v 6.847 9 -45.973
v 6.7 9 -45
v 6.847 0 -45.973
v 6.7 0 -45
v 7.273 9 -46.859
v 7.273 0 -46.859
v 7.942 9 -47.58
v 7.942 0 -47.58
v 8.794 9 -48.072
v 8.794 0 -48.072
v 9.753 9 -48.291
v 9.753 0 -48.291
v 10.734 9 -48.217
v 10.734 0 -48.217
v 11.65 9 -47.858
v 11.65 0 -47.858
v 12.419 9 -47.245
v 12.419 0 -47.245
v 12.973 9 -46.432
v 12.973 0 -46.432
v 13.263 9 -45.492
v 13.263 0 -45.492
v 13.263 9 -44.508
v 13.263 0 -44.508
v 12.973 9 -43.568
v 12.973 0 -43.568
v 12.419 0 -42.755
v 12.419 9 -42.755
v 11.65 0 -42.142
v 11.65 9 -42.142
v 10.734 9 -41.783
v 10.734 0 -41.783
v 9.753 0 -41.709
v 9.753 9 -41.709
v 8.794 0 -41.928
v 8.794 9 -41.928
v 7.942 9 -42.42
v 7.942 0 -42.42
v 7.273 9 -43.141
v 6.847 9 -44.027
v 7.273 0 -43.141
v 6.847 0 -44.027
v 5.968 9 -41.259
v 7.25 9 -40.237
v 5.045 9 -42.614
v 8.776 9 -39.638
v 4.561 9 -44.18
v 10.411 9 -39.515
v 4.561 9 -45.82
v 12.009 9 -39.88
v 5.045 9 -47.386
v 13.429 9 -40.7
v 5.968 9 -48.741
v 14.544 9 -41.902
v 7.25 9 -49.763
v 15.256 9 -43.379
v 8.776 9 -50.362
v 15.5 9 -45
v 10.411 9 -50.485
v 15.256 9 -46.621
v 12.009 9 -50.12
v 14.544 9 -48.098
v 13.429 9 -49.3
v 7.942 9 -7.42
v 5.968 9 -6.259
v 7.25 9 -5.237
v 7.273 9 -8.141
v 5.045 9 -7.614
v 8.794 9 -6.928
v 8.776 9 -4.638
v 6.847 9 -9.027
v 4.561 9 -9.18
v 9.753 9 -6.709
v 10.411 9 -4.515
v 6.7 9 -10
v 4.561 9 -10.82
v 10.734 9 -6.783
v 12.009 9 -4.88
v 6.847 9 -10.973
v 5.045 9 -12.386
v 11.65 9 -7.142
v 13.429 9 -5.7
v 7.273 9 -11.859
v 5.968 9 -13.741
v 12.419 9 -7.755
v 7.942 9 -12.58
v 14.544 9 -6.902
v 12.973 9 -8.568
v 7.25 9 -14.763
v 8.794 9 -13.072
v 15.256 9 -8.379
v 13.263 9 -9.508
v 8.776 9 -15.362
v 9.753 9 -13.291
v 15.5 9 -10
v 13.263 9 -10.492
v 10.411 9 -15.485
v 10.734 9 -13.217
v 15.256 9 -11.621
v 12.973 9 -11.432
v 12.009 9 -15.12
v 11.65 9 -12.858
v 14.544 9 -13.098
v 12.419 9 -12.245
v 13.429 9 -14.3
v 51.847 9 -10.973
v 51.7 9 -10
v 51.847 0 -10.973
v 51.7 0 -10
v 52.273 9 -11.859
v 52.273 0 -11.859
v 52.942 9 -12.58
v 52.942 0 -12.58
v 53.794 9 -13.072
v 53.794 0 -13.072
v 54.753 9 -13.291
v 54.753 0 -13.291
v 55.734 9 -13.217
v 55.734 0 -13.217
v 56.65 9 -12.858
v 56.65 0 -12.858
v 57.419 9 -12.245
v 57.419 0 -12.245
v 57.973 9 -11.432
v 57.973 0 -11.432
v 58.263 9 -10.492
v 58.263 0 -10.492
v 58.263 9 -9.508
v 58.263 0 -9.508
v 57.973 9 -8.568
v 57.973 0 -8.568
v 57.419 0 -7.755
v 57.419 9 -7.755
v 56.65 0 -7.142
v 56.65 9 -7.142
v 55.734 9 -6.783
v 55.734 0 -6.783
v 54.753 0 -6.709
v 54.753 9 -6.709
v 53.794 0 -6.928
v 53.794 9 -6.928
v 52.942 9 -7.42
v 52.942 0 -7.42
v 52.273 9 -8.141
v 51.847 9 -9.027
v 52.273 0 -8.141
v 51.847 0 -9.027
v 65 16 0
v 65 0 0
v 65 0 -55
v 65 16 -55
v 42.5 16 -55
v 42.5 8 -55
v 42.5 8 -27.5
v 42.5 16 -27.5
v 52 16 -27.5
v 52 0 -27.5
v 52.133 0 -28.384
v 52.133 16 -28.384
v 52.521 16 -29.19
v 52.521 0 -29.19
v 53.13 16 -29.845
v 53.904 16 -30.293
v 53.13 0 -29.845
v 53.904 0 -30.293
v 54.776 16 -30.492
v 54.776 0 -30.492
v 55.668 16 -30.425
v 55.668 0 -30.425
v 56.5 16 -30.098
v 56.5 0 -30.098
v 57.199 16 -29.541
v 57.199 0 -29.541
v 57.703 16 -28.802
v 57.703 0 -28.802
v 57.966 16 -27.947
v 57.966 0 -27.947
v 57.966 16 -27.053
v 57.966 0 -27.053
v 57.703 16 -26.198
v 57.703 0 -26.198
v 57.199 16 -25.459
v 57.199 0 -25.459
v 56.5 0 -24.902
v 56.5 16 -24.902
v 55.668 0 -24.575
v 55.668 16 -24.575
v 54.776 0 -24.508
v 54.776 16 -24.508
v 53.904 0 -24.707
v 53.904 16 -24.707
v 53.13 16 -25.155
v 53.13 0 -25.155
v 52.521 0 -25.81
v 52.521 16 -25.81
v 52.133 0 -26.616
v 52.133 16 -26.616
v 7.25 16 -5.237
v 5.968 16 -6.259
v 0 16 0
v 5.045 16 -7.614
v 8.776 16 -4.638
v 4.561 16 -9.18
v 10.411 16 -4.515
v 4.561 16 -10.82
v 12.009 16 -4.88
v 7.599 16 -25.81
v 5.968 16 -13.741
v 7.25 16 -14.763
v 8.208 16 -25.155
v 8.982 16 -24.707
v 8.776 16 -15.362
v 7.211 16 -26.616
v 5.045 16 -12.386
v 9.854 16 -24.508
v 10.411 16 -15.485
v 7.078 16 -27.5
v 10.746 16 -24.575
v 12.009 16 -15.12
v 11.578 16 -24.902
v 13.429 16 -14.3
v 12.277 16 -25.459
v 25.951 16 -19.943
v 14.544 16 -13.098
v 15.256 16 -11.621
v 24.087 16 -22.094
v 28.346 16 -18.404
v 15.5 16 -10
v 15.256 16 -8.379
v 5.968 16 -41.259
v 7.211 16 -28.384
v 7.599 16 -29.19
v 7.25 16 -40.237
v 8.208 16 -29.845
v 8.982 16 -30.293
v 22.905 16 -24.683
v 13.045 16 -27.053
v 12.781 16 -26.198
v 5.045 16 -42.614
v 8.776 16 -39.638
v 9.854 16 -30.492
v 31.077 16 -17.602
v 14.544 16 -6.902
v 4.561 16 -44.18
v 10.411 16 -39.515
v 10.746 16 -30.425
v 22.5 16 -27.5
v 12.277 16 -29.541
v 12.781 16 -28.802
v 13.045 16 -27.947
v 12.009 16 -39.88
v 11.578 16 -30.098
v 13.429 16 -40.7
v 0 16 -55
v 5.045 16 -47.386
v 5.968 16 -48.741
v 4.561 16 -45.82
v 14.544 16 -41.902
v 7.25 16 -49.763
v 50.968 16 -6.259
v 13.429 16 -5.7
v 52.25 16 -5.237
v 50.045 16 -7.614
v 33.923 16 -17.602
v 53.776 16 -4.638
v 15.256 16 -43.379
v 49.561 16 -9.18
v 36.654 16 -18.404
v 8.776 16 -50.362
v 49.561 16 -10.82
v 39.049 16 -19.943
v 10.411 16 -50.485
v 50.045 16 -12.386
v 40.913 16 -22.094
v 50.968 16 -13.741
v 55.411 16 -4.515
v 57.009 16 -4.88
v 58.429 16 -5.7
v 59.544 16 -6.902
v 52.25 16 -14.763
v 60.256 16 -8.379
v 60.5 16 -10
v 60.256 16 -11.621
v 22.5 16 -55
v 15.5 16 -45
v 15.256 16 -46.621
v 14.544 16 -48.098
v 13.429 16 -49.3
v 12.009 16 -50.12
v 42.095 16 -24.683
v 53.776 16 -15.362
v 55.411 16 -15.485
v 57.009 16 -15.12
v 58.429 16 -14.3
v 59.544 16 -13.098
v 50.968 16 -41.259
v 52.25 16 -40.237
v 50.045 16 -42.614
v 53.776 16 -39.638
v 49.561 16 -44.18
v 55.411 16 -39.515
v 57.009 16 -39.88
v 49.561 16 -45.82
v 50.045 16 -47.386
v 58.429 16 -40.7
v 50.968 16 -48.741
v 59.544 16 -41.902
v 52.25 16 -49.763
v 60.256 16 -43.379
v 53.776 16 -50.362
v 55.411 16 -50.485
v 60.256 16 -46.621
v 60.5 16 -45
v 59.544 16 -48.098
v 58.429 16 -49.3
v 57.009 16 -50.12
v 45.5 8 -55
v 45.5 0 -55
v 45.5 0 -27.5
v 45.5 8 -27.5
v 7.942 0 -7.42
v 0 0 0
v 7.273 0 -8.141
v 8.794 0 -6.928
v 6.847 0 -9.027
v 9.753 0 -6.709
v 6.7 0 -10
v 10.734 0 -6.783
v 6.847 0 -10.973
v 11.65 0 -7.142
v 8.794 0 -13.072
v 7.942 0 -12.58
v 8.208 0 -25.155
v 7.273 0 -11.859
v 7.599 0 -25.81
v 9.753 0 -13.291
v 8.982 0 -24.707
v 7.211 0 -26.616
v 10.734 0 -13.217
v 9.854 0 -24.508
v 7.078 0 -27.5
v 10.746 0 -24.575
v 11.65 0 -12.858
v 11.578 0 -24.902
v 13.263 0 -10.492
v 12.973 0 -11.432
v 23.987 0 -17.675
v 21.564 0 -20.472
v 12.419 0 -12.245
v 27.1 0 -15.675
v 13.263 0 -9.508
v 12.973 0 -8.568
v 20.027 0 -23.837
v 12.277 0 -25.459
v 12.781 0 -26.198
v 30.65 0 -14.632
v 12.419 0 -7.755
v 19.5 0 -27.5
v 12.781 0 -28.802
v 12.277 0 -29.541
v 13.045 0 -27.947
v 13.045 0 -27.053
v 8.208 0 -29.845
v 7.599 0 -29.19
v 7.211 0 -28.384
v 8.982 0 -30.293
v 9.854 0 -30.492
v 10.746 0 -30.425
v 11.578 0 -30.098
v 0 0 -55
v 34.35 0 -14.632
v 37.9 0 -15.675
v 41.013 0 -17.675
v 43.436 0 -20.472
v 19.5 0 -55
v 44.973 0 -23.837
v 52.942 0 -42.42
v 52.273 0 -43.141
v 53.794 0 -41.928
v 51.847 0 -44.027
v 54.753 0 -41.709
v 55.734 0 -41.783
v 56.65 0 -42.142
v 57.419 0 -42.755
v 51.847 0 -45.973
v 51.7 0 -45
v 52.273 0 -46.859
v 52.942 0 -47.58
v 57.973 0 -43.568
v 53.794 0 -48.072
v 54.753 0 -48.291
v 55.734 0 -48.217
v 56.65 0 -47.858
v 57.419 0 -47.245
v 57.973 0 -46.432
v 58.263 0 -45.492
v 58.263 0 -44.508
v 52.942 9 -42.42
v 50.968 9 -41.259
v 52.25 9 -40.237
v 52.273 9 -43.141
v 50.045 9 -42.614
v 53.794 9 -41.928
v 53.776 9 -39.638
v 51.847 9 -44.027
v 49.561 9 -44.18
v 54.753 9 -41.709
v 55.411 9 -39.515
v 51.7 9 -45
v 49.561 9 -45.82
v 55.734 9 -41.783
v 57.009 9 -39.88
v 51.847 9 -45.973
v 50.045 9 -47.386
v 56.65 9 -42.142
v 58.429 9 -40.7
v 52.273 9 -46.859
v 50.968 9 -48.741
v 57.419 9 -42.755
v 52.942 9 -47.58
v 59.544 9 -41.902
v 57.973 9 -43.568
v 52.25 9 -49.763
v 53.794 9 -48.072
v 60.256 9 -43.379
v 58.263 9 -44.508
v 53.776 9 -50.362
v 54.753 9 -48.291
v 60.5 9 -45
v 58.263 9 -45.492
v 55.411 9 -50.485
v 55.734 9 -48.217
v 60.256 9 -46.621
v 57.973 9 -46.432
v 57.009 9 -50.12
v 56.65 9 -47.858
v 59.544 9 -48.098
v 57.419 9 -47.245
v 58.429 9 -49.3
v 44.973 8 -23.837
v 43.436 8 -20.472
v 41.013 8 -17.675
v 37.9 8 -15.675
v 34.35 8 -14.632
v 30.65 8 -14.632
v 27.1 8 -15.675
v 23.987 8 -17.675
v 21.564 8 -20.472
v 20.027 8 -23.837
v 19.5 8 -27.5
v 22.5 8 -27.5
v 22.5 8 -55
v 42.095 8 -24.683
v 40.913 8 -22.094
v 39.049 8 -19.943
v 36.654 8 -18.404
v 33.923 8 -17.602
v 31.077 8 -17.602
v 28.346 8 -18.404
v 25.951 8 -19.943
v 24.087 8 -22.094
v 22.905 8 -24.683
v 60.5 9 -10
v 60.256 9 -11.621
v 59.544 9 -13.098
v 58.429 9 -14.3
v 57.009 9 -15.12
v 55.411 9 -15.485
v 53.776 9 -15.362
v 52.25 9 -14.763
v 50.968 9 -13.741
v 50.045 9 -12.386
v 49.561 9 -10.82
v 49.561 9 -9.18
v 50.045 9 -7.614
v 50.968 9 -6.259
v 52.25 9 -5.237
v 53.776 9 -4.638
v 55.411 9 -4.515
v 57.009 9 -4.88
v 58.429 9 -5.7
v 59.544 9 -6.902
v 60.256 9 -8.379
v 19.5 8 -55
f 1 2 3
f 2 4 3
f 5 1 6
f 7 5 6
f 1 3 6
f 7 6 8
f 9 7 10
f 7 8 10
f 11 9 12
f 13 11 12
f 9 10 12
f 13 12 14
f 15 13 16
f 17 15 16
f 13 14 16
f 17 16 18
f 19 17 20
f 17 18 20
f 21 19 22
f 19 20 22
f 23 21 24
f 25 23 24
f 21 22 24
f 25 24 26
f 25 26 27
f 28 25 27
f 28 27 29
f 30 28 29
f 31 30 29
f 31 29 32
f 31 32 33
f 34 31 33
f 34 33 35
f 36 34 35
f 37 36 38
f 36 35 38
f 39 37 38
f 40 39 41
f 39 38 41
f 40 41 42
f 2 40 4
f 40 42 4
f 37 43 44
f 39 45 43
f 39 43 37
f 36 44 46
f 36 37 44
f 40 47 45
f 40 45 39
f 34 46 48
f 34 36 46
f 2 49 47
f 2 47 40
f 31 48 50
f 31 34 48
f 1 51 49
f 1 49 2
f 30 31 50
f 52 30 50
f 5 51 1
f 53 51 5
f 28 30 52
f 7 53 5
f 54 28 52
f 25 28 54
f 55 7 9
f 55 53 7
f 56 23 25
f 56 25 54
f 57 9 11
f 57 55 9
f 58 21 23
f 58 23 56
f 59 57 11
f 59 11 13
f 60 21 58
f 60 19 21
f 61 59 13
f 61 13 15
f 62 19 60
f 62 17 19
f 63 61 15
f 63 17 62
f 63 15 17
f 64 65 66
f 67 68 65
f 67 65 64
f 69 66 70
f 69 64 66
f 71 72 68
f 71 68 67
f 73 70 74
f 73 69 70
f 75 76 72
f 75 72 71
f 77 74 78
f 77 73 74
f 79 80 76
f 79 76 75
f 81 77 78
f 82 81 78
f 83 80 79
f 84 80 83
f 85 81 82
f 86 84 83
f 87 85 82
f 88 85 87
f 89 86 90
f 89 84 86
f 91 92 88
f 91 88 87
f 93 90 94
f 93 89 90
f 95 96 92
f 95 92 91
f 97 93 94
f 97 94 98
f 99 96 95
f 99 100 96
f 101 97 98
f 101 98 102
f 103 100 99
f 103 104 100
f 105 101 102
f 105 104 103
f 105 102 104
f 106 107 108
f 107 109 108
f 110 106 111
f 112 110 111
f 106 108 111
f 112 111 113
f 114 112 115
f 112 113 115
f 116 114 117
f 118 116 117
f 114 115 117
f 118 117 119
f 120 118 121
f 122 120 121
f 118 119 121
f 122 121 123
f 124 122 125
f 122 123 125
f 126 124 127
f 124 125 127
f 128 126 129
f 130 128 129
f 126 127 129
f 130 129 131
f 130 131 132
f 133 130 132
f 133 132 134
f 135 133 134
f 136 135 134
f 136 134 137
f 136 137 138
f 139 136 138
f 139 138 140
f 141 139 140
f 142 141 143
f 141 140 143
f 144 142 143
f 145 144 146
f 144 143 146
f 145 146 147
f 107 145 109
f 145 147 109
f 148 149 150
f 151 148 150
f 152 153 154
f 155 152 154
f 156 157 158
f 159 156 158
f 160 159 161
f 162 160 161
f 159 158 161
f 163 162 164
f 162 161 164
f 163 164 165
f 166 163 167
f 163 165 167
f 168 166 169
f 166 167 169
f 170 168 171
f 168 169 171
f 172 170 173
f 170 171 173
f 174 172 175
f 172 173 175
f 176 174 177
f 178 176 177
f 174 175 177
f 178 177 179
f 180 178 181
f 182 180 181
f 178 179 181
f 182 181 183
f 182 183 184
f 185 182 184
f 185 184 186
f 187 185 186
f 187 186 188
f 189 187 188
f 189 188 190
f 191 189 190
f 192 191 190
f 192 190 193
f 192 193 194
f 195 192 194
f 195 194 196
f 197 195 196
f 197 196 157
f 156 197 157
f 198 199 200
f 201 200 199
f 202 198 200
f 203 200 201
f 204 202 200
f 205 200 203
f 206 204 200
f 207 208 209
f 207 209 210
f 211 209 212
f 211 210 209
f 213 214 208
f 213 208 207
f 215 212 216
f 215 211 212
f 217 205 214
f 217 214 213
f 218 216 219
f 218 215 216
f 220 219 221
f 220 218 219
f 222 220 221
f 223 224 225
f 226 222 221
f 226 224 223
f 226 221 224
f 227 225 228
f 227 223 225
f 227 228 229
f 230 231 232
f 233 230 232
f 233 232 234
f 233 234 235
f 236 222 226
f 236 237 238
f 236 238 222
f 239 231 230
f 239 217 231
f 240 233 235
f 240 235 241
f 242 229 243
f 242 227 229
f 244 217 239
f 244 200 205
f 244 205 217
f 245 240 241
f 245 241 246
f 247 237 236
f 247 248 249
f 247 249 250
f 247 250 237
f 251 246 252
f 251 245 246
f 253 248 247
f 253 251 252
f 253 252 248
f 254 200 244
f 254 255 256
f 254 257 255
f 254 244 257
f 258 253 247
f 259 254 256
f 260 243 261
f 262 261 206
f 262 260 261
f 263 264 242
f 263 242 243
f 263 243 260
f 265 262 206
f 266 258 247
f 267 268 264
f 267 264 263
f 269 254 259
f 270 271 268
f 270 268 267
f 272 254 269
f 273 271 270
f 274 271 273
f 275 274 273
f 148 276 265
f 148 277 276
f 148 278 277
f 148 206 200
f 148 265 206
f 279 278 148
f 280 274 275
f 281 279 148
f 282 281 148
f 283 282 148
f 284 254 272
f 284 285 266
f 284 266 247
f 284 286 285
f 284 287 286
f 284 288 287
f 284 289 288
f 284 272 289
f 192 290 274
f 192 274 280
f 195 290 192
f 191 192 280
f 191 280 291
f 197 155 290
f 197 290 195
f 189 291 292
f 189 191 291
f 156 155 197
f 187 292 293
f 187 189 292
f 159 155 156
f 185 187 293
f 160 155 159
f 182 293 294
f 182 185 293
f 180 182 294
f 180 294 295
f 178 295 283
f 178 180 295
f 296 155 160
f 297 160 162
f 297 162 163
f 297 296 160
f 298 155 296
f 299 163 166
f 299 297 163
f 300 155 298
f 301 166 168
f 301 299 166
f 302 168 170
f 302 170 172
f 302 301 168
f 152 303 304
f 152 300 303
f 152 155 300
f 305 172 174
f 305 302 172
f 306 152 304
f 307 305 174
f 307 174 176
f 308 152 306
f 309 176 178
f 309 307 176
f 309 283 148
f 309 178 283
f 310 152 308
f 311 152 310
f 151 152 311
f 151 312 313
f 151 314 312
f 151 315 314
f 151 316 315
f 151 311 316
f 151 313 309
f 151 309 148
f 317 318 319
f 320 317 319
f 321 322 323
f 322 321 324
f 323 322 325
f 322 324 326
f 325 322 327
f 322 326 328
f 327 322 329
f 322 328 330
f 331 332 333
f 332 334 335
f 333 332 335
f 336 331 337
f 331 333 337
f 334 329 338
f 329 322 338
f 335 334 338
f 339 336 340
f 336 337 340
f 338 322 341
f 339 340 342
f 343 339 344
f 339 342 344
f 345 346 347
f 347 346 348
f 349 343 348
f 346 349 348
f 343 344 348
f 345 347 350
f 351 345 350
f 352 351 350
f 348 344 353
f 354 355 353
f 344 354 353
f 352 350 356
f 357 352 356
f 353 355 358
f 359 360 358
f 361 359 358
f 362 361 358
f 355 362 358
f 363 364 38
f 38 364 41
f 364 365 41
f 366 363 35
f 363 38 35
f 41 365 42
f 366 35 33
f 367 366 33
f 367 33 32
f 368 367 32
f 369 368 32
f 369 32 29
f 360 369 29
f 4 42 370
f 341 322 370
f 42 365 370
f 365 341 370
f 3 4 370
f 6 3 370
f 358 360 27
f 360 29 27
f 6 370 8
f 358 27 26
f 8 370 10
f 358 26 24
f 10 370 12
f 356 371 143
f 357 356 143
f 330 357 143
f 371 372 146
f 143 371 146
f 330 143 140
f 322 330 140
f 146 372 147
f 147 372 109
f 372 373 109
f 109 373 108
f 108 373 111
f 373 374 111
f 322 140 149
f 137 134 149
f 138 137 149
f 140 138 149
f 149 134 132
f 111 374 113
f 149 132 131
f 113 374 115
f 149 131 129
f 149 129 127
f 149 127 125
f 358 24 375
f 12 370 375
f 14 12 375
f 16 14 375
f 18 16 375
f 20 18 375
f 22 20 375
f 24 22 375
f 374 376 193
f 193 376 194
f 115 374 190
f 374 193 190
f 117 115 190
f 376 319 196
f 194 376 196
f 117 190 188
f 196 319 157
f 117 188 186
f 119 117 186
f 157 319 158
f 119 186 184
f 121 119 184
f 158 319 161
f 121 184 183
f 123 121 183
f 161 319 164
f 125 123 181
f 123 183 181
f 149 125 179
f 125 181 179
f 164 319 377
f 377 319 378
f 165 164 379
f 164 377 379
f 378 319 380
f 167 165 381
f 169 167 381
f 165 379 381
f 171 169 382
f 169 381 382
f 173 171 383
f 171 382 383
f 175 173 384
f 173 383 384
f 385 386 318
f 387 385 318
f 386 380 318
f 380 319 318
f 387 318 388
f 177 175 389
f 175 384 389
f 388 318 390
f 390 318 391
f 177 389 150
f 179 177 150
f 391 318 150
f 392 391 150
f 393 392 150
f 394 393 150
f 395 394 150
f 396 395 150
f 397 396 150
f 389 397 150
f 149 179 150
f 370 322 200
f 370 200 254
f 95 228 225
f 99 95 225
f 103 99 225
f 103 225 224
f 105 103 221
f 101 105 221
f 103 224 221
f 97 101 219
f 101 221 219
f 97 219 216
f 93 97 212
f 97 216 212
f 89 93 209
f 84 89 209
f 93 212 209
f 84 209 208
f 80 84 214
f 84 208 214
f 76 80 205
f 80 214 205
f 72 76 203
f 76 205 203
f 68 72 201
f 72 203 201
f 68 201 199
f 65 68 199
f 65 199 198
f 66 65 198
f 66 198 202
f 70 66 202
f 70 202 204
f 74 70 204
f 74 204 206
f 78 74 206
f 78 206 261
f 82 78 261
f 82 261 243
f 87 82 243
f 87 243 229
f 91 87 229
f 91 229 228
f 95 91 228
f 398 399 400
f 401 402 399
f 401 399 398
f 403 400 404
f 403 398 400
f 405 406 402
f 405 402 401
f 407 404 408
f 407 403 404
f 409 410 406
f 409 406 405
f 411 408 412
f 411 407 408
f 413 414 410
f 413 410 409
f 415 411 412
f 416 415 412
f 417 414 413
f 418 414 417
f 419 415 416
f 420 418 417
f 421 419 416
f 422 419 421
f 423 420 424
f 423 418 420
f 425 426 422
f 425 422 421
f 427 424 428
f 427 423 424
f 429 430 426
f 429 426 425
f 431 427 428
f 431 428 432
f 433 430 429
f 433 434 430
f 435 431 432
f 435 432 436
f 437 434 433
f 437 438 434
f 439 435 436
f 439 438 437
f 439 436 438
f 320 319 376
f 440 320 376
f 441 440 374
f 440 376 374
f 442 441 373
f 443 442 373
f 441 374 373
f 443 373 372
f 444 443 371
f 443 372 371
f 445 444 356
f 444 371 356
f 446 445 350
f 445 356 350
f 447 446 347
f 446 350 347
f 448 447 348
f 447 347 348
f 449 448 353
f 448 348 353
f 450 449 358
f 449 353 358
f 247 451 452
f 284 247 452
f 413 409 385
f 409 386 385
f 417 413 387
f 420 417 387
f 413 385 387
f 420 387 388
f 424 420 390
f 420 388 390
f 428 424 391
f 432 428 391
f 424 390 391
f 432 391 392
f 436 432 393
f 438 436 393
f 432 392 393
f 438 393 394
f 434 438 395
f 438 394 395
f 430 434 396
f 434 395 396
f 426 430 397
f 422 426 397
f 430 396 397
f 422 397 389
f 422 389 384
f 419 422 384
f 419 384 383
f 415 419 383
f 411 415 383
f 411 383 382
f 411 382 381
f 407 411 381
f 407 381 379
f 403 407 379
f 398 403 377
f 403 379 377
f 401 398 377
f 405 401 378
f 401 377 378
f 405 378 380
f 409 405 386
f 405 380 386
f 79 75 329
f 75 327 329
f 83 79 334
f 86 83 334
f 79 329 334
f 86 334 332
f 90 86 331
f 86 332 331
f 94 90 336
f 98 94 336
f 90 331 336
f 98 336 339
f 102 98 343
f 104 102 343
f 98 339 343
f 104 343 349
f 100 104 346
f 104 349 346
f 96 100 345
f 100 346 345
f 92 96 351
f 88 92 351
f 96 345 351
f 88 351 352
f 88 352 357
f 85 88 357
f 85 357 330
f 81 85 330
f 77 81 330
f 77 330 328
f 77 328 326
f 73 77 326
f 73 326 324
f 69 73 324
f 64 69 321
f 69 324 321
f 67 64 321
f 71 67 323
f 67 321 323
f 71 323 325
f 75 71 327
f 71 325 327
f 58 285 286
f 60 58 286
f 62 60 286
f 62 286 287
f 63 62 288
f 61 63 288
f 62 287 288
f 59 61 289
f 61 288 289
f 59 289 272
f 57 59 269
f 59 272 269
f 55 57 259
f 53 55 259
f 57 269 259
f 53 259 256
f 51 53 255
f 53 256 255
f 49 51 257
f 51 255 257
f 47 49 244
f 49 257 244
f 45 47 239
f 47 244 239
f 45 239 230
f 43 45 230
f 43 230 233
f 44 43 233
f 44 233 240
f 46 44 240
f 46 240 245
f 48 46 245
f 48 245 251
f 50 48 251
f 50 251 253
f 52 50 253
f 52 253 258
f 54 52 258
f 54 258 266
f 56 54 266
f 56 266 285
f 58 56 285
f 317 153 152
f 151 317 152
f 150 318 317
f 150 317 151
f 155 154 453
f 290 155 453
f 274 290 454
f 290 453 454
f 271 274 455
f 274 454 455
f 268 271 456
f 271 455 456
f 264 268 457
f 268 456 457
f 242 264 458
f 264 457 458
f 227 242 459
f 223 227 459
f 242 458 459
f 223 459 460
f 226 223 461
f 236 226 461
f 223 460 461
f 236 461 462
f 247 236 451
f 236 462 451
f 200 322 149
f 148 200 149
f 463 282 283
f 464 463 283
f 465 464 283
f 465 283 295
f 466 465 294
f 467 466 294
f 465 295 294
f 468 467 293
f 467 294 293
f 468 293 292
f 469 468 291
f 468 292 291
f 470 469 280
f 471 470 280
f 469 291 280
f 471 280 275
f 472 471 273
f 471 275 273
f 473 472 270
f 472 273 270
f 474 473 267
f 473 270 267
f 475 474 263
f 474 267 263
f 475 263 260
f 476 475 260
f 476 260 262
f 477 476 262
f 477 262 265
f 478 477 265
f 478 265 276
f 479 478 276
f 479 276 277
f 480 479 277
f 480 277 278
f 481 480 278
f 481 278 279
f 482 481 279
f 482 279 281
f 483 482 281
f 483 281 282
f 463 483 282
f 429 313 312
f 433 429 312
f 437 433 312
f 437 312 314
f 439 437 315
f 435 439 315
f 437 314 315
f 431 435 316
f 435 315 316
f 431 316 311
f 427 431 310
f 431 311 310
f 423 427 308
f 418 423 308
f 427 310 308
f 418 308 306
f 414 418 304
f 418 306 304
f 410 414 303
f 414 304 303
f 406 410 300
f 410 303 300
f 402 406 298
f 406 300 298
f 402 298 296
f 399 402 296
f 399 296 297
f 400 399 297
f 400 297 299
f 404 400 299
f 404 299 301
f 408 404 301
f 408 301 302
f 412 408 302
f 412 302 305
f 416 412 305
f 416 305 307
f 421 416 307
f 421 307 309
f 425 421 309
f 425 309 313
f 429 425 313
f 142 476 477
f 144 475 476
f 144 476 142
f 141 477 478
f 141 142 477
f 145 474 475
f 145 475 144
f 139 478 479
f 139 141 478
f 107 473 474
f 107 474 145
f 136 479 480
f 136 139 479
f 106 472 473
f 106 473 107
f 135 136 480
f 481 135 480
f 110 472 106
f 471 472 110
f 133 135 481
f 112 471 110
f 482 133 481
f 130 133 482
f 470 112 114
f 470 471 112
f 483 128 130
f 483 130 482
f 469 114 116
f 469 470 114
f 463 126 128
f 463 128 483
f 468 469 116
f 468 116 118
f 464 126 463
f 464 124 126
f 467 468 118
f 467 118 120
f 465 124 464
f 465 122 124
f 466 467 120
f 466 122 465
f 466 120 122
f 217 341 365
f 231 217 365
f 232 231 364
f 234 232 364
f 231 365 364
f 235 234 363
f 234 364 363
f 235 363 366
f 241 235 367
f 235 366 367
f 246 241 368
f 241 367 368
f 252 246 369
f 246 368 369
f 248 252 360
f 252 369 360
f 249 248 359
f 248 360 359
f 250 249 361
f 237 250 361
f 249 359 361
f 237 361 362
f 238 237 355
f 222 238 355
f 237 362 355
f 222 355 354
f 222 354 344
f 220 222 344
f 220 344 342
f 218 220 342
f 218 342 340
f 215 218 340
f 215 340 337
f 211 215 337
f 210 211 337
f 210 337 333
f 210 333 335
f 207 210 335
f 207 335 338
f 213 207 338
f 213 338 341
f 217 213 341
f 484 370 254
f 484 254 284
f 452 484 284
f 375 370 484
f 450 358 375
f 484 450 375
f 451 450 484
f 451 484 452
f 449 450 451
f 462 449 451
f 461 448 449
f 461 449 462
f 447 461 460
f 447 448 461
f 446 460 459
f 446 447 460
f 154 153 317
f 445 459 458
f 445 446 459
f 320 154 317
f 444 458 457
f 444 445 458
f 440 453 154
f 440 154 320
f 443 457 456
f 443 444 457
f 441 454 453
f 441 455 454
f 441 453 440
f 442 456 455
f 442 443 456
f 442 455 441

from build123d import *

# Parameters (mm, degrees)
SKETCH1_W                                            = 65
SKETCH1_H                                            = 55
BOSS_EXTRUDE1_DEPTH                                  = 16
CBORE_SLOT_FOR_M6_HEX_SOCKET_HEAD_CAP_SC_D           = 6.6
CBORE_SLOT_FOR_M6_HEX_SOCKET_HEAD_CAP_SC_CBORE_D     = 11
CBORE_SLOT_FOR_M6_HEX_SOCKET_HEAD_CAP_SC_CBORE_DEPTH = 7
F_6_0MM_DOWEL_HOLE1_D                                = 6
SKETCH23_R                                           = 13
CUT_EXTRUDE2_DEPTH                                   = 8
SKETCH24_R                                           = 10
CUT_EXTRUDE3_DEPTH                                   = 86.521927013


with BuildPart() as part:
    # Sketch1 → Boss-Extrude1 (new body)
    with BuildSketch(Plane(origin=(0, 0, 0), x_dir=(1, 0, 0), z_dir=(0, 1, 0))):
        with Locations((32.5, 27.5)):
            Rectangle(SKETCH1_W, SKETCH1_H)
    extrude(amount=BOSS_EXTRUDE1_DEPTH)

    # CBORE SLOT for M6 Hex Socket Head Cap Screw1 (through all)
    with Locations(Plane(origin=(0, 16, 0), x_dir=(1, 0, 0), z_dir=(0, 1, 0))):
        with Locations((10, 45), (55, 45), (55, 10), (10, 10)):
            CounterBoreHole(CBORE_SLOT_FOR_M6_HEX_SOCKET_HEAD_CAP_SC_D / 2, CBORE_SLOT_FOR_M6_HEX_SOCKET_HEAD_CAP_SC_CBORE_D / 2, CBORE_SLOT_FOR_M6_HEX_SOCKET_HEAD_CAP_SC_CBORE_DEPTH)

    # Ø6.0mm Dowel Hole1 (through all)
    with Locations(Plane(origin=(0, 16, 0), x_dir=(1, 0, 0), z_dir=(0, 1, 0))):
        with Locations((10.078116325, 27.5), (55, 27.5)):
            Hole(F_6_0MM_DOWEL_HOLE1_D / 2)

    # Sketch23 → Cut-Extrude2 (cut)
    with BuildSketch(Plane.XZ):
        with BuildLine():
            ThreePointArc((45.5, -27.5), (32.5, -40.5), (19.5, -27.5))
            Line((19.5, -27.5), (19.5, -55))
            Line((19.5, -55), (45.5, -55))
            Line((45.5, -55), (45.5, -27.5))
        make_face()
        with Locations((32.5, -27.5)):
            Circle(SKETCH23_R)
    extrude(amount=-CUT_EXTRUDE2_DEPTH, mode=Mode.SUBTRACT)

    # Sketch24 → Cut-Extrude3 (cut, through all)
    with BuildSketch(Plane.XZ.offset(-8)):
        with Locations((32.5, -27.5)):
            Circle(SKETCH24_R)
        with BuildLine():
            Line((42.5, -55), (42.5, -27.5))
            ThreePointArc((42.5, -27.5), (32.5, -37.5), (22.5, -27.5))
            Line((22.5, -27.5), (22.5, -55))
            Line((22.5, -55), (42.5, -55))
        make_face()
    extrude(amount=-CUT_EXTRUDE3_DEPTH, mode=Mode.SUBTRACT)


solid = part.part
